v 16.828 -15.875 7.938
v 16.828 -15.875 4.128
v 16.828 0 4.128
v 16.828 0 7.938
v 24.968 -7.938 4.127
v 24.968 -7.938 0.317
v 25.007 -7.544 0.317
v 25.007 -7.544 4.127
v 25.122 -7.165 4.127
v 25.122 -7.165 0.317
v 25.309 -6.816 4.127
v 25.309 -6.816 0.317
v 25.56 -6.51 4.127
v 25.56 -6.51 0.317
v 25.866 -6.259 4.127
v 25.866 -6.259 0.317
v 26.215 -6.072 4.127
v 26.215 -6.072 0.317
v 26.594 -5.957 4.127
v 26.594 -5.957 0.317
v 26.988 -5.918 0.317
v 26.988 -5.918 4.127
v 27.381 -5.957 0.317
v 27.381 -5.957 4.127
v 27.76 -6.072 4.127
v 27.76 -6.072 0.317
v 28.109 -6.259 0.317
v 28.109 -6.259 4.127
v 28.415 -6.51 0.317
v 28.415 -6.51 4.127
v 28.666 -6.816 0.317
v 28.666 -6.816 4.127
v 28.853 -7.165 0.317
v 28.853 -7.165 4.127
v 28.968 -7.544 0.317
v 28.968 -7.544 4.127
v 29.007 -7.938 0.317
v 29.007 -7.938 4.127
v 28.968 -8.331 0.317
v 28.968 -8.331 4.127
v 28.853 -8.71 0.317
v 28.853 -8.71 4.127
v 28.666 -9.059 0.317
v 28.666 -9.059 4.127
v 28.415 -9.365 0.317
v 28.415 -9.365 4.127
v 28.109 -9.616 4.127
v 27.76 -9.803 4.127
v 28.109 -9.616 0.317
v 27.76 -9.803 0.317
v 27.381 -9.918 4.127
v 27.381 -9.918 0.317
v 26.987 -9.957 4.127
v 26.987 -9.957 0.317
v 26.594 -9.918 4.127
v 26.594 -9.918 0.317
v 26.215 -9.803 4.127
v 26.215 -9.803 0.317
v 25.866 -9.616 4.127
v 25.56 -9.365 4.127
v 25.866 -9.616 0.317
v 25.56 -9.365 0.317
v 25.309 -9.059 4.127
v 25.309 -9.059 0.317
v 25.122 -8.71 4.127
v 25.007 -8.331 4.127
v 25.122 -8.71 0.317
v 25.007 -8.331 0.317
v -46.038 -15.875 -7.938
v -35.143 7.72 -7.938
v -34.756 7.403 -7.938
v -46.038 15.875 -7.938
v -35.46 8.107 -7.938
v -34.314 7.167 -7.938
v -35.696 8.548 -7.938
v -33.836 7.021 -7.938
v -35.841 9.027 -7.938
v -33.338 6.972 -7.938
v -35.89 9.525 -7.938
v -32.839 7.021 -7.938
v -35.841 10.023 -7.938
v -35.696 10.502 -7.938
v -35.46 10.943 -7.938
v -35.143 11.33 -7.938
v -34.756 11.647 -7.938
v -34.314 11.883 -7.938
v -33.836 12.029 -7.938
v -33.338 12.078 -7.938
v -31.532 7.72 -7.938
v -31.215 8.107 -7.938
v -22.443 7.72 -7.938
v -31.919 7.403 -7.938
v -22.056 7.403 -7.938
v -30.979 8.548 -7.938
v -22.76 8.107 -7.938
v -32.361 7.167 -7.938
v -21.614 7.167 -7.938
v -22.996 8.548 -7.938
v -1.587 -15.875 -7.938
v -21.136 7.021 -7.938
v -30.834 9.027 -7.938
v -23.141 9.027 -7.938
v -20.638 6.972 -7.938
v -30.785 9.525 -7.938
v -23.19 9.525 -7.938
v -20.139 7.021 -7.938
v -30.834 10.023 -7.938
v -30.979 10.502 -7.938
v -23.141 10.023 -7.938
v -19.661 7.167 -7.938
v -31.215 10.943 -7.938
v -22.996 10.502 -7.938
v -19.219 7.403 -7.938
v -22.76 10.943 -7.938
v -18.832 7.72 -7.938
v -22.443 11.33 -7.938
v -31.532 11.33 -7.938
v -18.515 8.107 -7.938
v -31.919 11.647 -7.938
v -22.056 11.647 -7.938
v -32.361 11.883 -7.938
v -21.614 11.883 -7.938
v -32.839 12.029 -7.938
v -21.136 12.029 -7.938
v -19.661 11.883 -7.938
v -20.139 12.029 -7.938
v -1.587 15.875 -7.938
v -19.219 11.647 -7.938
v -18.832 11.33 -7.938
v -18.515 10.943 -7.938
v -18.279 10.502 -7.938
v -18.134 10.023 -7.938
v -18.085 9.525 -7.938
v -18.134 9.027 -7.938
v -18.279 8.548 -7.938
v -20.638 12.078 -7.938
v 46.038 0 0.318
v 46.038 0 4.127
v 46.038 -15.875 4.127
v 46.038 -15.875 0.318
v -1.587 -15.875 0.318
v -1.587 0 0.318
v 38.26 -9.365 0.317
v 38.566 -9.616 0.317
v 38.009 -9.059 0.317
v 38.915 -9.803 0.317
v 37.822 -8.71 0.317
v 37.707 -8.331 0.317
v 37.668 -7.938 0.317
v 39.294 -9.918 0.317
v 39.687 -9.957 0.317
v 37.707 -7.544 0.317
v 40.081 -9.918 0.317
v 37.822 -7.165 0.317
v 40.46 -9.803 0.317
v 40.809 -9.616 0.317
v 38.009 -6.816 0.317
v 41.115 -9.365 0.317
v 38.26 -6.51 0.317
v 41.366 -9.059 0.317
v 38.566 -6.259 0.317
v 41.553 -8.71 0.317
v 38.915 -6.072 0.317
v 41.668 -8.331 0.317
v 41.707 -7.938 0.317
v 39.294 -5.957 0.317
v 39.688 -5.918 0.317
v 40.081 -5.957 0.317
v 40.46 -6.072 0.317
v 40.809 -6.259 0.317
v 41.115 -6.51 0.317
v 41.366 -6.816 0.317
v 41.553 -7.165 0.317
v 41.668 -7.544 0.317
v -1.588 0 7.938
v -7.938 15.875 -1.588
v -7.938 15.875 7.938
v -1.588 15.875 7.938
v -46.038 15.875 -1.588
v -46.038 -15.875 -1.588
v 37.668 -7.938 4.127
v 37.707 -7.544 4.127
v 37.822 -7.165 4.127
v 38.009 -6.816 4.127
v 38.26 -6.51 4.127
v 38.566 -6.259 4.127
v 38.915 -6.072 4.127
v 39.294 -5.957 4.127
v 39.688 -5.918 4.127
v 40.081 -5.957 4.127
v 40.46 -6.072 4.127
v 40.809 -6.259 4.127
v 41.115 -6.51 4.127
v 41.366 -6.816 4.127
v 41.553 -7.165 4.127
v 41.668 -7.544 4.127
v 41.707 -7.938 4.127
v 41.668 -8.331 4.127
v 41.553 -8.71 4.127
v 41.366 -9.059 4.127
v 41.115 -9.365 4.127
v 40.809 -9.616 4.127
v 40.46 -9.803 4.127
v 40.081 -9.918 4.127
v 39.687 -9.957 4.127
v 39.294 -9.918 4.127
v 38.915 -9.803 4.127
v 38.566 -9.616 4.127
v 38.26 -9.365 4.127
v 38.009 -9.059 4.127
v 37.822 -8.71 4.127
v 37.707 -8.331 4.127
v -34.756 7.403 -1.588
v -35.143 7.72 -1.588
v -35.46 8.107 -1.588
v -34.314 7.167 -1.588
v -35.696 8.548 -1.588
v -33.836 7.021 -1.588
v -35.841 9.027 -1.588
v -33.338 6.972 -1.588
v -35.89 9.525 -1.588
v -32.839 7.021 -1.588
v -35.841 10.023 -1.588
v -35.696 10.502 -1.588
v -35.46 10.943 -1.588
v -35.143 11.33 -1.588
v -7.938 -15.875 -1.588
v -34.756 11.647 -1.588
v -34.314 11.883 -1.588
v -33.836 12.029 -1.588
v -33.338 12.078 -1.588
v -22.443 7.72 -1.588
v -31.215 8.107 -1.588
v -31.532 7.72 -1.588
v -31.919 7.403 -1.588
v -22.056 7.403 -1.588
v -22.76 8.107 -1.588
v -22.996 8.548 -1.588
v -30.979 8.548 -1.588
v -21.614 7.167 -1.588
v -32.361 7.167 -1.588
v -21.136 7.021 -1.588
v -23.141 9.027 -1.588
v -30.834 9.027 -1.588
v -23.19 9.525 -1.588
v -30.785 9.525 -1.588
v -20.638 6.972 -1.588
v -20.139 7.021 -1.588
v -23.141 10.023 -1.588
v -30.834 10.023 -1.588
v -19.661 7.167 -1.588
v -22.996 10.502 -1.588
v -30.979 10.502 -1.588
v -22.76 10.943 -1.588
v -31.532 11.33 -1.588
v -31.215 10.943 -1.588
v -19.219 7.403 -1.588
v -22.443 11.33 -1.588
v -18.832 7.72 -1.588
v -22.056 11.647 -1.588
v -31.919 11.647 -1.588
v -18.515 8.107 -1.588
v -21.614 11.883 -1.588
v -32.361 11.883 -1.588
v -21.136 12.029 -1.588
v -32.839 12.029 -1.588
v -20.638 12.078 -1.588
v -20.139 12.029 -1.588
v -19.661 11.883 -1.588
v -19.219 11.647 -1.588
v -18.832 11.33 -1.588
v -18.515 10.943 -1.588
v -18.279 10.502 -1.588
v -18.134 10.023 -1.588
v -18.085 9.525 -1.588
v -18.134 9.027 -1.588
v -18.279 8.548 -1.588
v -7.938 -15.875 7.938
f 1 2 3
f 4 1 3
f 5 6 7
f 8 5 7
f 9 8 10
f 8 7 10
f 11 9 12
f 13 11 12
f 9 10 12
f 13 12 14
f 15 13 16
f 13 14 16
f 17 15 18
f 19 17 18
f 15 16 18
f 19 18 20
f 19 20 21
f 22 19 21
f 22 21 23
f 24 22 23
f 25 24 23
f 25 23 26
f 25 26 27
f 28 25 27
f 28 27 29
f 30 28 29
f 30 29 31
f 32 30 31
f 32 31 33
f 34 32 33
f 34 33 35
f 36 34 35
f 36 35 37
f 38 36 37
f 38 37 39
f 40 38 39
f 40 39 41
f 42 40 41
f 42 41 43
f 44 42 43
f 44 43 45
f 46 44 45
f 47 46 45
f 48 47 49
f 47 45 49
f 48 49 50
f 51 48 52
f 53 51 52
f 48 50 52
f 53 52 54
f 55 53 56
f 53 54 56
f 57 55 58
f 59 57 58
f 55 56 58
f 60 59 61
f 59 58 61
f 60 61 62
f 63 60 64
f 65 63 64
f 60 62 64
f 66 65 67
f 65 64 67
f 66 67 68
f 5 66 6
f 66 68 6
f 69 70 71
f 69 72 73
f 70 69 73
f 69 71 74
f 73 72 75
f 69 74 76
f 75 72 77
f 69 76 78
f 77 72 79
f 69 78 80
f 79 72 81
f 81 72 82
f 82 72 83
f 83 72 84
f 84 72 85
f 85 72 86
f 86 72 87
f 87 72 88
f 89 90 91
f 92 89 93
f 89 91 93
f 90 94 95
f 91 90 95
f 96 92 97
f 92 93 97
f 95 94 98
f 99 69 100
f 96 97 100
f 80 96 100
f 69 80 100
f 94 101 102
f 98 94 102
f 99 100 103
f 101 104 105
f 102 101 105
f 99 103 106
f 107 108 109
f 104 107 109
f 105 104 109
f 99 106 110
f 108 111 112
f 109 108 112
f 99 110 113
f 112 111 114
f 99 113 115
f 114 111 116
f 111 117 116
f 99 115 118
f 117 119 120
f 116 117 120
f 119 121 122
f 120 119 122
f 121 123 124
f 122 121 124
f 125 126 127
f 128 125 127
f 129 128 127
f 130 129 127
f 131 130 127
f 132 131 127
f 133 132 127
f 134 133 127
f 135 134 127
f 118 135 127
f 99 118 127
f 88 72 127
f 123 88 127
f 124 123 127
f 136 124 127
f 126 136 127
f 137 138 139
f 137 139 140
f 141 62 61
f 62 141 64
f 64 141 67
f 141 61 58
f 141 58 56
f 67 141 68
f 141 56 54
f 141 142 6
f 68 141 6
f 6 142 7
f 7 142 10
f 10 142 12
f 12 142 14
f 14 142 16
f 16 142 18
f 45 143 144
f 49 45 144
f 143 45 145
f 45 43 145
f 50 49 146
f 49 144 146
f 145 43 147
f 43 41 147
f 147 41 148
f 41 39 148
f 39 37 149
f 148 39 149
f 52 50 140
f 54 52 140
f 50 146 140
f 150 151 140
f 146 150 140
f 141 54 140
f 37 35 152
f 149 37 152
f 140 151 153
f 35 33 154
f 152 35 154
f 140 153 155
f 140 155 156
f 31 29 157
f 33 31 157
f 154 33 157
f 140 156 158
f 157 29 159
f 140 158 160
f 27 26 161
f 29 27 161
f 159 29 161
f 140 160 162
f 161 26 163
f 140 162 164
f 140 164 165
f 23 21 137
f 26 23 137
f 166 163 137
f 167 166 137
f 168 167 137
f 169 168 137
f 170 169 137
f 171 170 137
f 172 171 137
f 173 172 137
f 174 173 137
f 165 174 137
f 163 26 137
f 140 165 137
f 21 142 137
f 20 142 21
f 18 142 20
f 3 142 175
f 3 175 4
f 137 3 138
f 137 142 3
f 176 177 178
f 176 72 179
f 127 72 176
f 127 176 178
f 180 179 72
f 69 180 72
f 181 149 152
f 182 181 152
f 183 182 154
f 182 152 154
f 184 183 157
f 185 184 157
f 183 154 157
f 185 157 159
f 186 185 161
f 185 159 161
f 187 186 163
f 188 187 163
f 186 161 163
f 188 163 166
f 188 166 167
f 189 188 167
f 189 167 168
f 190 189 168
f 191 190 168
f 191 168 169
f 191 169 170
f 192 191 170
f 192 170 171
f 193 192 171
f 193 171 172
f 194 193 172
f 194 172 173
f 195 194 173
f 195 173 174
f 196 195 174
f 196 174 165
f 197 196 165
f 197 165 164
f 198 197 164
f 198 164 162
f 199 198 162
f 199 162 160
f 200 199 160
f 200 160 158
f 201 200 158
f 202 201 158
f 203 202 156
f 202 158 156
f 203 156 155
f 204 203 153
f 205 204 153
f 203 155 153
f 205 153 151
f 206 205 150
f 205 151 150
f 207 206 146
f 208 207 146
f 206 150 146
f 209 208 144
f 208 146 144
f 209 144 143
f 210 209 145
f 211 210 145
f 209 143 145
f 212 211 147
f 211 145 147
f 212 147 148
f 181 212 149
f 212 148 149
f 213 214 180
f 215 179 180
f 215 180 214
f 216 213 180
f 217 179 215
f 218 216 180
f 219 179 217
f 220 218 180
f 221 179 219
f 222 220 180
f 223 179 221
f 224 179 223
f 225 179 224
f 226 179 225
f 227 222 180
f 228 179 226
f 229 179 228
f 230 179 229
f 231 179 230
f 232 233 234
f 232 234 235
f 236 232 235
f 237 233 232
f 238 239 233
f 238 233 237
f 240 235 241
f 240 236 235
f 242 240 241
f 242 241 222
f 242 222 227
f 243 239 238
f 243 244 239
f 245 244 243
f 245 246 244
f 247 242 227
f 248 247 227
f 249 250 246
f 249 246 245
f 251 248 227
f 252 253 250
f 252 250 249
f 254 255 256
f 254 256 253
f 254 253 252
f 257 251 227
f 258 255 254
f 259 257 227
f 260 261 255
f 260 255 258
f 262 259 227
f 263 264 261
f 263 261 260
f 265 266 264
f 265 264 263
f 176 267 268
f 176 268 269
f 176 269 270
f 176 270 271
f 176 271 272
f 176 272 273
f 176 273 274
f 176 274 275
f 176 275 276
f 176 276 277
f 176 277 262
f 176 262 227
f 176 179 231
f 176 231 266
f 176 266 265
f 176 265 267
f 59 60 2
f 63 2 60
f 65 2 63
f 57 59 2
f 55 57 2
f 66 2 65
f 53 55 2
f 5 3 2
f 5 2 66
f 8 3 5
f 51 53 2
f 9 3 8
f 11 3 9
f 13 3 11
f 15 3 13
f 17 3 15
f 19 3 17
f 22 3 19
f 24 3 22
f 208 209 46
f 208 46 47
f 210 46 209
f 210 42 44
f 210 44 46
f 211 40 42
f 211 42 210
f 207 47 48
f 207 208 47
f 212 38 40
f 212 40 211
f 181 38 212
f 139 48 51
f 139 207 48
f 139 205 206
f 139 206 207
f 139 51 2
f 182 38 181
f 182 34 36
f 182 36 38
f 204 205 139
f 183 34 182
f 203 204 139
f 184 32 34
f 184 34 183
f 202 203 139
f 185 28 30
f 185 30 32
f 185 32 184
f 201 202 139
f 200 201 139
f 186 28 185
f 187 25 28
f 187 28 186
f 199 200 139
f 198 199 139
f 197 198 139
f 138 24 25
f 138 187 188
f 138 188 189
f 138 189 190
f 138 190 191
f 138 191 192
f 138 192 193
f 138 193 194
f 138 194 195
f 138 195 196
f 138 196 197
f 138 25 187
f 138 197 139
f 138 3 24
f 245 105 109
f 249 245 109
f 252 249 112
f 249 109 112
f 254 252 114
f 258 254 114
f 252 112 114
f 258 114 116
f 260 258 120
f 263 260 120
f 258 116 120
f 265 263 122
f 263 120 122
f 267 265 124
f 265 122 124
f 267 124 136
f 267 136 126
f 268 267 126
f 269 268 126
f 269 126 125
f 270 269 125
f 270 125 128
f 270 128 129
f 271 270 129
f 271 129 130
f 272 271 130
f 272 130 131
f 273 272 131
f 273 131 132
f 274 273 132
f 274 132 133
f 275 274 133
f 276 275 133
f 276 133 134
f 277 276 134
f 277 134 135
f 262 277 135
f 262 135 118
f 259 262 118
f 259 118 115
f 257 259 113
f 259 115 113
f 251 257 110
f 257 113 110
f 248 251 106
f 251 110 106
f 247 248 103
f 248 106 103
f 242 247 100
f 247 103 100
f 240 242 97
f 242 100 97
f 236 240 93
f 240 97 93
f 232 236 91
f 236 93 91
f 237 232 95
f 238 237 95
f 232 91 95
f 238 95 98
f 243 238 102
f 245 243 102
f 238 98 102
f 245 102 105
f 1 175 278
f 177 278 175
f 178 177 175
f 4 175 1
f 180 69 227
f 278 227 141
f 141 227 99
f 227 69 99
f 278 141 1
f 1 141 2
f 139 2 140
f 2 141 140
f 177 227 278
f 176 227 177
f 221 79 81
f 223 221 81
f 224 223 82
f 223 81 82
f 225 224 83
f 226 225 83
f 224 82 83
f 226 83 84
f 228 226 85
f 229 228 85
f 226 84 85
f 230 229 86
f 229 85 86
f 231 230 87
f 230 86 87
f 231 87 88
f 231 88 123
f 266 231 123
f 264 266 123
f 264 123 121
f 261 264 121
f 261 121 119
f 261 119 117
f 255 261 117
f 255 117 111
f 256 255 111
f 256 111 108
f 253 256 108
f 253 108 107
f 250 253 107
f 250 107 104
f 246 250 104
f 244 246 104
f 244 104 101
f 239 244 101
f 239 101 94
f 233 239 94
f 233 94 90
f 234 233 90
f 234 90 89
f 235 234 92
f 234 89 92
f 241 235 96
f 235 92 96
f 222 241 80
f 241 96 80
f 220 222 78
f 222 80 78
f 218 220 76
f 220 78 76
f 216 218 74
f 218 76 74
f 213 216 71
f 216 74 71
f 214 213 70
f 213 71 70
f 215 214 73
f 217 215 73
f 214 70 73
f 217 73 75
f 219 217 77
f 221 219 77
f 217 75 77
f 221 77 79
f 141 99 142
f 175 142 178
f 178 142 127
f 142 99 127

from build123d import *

# Parameters (mm, degrees)
SKETCH1_W                    = 92.075
SKETCH1_H                    = 15.875
BOSS_EXTRUDE1_DEPTH          = 15.875
CUT_EXTRUDE1_REACH           = 53.22
SKETCH2_W                    = 47.625
SKETCH2_H                    = 15.875
F_10_0_1935_DIAMETER_HOLE1_D = 5.1054
CUT_EXTRUDE2_REACH           = 51.34
SKETCH5_W                    = 47.625
SKETCH5_H                    = 8.255
CUT_EXTRUDE3_REACH           = 51.34
SKETCH6_W                    = 47.625
SKETCH6_H                    = 3.81
SKETCH7_W                    = 38.1
SKETCH7_H                    = 9.525
CUT_EXTRUDE4_DEPTH           = 57.484668827
SKETCH8_W                    = 6.35
SKETCH8_H                    = 3.81
CUT_EXTRUDE5_DEPTH           = 57.484668827
F_10_32_TAPPED_HOLE1_D       = 4.0386
SKETCH11_W                   = 24.765
SKETCH11_H                   = 15.875
BOSS_EXTRUDE2_DEPTH          = 3.81
SKETCH12_W                   = 6.35
SKETCH12_H                   = 15.875
BOSS_EXTRUDE3_DEPTH          = 3.81


with BuildPart() as part:
    # Sketch1 → Boss-Extrude1 (new, symmetric)
    with BuildSketch(Plane(origin=(0, 0, 0), x_dir=(1, 0, 0), z_dir=(0, 1, 0))):
        Rectangle(SKETCH1_W, SKETCH1_H)
    extrude(amount=BOSS_EXTRUDE1_DEPTH, both=True)

    # Sketch2 → Cut-Extrude1 (cut, up to next)
    with BuildSketch(Plane.XY.offset(7.9375), mode=Mode.PRIVATE) as cut_extrude1_sk1:
        with Locations((22.225, 7.9375)):
            Rectangle(SKETCH2_W, SKETCH2_H)
    cut_extrude1_tool1 = extrude(cut_extrude1_sk1.sketch, amount=-CUT_EXTRUDE1_REACH, mode=Mode.PRIVATE) & part.part
    add(cut_extrude1_tool1.solids().sort_by_distance((22.225, 7.9375, 7.9375))[0], mode=Mode.SUBTRACT)

    # #10 (0.1935) Diameter Hole1 (through all)
    with Locations(Plane.XY.offset(7.9375)):
        with Locations((-33.3375, 9.525), (-20.6375, 9.525)):
            Hole(F_10_0_1935_DIAMETER_HOLE1_D / 2)

    # Sketch5 → Cut-Extrude2 (cut, up to next)
    with BuildSketch(Plane(origin=(0, 0, 0), x_dir=(1, 0, 0), z_dir=(0, 1, 0)), mode=Mode.PRIVATE) as cut_extrude2_sk1:
        with Locations((22.225, 3.81)):
            Rectangle(SKETCH5_W, SKETCH5_H)
    cut_extrude2_tool1 = extrude(cut_extrude2_sk1.sketch, amount=-CUT_EXTRUDE2_REACH, mode=Mode.PRIVATE) & part.part
    add(cut_extrude2_tool1.solids().sort_by_distance((22.225, 0, -3.81))[0], mode=Mode.SUBTRACT)

    # Sketch6 → Cut-Extrude3 (cut, up to next)
    with BuildSketch(Plane(origin=(0, 0, 0), x_dir=(1, 0, 0), z_dir=(0, 1, 0)), mode=Mode.PRIVATE) as cut_extrude3_sk1:
        with Locations((22.225, -6.0325)):
            Rectangle(SKETCH6_W, SKETCH6_H)
    cut_extrude3_tool1 = extrude(cut_extrude3_sk1.sketch, amount=-CUT_EXTRUDE3_REACH, mode=Mode.PRIVATE) & part.part
    add(cut_extrude3_tool1.solids().sort_by_distance((22.225, 0, 6.0325))[0], mode=Mode.SUBTRACT)

    # Sketch7 → Cut-Extrude4 (cut, through all)
    with BuildSketch(Plane(origin=(0, 15.875, 0), x_dir=(1, 0, 0), z_dir=(0, 1, 0))):
        with Locations((-26.9875, -3.175)):
            Rectangle(SKETCH7_W, SKETCH7_H)
    extrude(amount=-CUT_EXTRUDE4_DEPTH, mode=Mode.SUBTRACT)

    # Sketch8 → Cut-Extrude5 (cut, through all)
    with BuildSketch(Plane(origin=(0, 15.875, 0), x_dir=(1, 0, 0), z_dir=(0, 1, 0))):
        with Locations((-4.7625, -6.0325)):
            Rectangle(SKETCH8_W, SKETCH8_H)
    extrude(amount=-CUT_EXTRUDE5_DEPTH, mode=Mode.SUBTRACT)

    # #10-32 Tapped Hole1 (through all)
    with Locations(Plane.XY.offset(4.1275)):
        with Locations((39.6875, -7.9375), (26.9875, -7.9375)):
            Hole(F_10_32_TAPPED_HOLE1_D / 2)

    # Sketch11 → Boss-Extrude2 (add)
    with BuildSketch(Plane.XY.offset(4.1275)):
        with Locations((4.445, -7.9375)):
            Rectangle(SKETCH11_W, SKETCH11_H)
    extrude(amount=BOSS_EXTRUDE2_DEPTH)

    # Sketch12 → Boss-Extrude3 (add)
    with BuildSketch(Plane.XY.offset(4.1275)):
        with Locations((-4.7625, 7.9375)):
            Rectangle(SKETCH12_W, SKETCH12_H)
    extrude(amount=BOSS_EXTRUDE3_DEPTH)


solid = part.part
